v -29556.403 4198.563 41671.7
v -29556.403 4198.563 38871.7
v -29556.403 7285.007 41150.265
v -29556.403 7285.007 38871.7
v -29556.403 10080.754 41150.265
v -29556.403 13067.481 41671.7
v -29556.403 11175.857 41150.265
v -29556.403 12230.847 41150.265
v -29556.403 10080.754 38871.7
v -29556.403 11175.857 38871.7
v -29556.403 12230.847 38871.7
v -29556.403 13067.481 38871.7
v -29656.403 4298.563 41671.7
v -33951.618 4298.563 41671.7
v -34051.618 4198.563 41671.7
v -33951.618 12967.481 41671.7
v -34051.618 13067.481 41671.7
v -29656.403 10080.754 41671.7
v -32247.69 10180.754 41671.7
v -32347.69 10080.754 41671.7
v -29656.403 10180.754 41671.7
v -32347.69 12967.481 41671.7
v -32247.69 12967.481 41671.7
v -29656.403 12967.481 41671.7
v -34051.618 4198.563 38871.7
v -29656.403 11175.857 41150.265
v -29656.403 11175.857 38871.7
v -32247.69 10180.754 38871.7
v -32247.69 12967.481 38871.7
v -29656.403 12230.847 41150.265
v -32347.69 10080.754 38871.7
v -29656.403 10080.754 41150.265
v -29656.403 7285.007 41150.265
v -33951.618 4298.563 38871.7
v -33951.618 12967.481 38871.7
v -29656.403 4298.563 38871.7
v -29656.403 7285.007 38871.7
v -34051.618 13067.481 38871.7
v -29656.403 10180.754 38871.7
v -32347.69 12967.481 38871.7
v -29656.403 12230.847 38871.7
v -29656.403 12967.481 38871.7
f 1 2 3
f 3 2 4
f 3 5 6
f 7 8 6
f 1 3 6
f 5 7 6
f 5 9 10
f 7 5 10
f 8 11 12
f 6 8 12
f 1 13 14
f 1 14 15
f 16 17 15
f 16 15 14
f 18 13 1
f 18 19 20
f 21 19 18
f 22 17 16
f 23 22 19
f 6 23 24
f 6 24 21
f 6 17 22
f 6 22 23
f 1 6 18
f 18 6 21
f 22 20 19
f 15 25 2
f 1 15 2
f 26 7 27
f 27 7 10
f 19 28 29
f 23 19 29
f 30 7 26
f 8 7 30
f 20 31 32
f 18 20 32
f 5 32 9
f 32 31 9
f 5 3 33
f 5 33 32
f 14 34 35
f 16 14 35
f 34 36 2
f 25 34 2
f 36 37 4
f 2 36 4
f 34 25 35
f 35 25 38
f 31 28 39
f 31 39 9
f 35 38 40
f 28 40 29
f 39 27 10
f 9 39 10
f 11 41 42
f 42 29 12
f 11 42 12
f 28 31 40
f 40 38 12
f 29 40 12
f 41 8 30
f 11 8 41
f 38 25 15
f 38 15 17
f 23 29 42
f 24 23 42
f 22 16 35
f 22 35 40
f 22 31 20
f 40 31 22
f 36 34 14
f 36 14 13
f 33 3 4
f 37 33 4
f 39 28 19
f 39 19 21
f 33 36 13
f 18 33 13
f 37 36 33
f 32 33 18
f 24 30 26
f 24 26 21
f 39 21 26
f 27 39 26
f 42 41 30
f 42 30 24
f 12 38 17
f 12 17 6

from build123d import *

# Parameters (mm, degrees)
EXTRUDE_THIN1_OUTLINE_W   = 4495.215169973
EXTRUDE_THIN1_OUTLINE_H   = 8868.918797099
EXTRUDE_THIN1_OUTLINE_W_2 = 4295.215169973
EXTRUDE_THIN1_OUTLINE_H_2 = 8668.918797099
EXTRUDE_THIN1_DEPTH       = 2800
SKETCH2_W                 = 2278.564495204
SKETCH2_H                 = 3084.203300048
SKETCH2_H_2               = 1183.861490667
CUT_EXTRUDE1_DEPTH        = 270
SKETCH3_W                 = 2791.287447335
SKETCH3_H                 = 2986.727723293
SKETCH3_W_2               = 2591.287447335
SKETCH3_H_2               = 2786.727723293
EXTRUDE_THIN2_DEPTH       = 2800
SKETCH4_W                 = 2278.564495204
SKETCH4_H                 = 1054.990856004
CUT_EXTRUDE2_DEPTH        = 140


# Read off the part's stored shape, not the designer's step: Extrude-Thin1
with BuildPart() as part:
    # Extrude-Thin1 outline → Extrude-Thin1 (new body)
    with BuildSketch(Plane.XY.offset(38871.700196057)):
        with Locations((-31804.010098304, 8633.021968037)):
            Rectangle(EXTRUDE_THIN1_OUTLINE_W, EXTRUDE_THIN1_OUTLINE_H)
        with Locations((-31804.010098304, 8633.021968037)):
            Rectangle(EXTRUDE_THIN1_OUTLINE_W_2, EXTRUDE_THIN1_OUTLINE_H_2, mode=Mode.SUBTRACT)
    extrude(amount=EXTRUDE_THIN1_DEPTH)

    # Sketch2 → Cut-Extrude1 (cut)
    with BuildSketch(Plane(origin=(-29556.402513318, 0, 0), x_dir=(0, 0, -1), z_dir=(1, 0, 0))):
        with Locations((-40010.982443659, 8827.108478048)):
            Rectangle(SKETCH2_W, SKETCH2_H)
        with Locations((-40010.982443659, 11948.084927174)):
            Rectangle(SKETCH2_W, SKETCH2_H_2)
    extrude(amount=-CUT_EXTRUDE1_DEPTH, mode=Mode.SUBTRACT)

    # Sketch3 → Extrude-Thin2 (add)
    with BuildSketch(Plane.XY.offset(38871.700196057)):
        with Locations((-30952.046236986, 11574.11750494)):
            Rectangle(SKETCH3_W, SKETCH3_H)
        with Locations((-30952.046236986, 11574.11750494)):
            Rectangle(SKETCH3_W_2, SKETCH3_H_2, mode=Mode.SUBTRACT)
    extrude(amount=EXTRUDE_THIN2_DEPTH)

    # Sketch4 → Cut-Extrude2 (cut)
    with BuildSketch(Plane(origin=(-29556.402513318, 0, 0), x_dir=(0, 0, -1), z_dir=(1, 0, 0))):
        with Locations((-40010.982443659, 11703.351961029)):
            Rectangle(SKETCH4_W, SKETCH4_H)
    extrude(amount=-CUT_EXTRUDE2_DEPTH, mode=Mode.SUBTRACT)


solid = part.part
